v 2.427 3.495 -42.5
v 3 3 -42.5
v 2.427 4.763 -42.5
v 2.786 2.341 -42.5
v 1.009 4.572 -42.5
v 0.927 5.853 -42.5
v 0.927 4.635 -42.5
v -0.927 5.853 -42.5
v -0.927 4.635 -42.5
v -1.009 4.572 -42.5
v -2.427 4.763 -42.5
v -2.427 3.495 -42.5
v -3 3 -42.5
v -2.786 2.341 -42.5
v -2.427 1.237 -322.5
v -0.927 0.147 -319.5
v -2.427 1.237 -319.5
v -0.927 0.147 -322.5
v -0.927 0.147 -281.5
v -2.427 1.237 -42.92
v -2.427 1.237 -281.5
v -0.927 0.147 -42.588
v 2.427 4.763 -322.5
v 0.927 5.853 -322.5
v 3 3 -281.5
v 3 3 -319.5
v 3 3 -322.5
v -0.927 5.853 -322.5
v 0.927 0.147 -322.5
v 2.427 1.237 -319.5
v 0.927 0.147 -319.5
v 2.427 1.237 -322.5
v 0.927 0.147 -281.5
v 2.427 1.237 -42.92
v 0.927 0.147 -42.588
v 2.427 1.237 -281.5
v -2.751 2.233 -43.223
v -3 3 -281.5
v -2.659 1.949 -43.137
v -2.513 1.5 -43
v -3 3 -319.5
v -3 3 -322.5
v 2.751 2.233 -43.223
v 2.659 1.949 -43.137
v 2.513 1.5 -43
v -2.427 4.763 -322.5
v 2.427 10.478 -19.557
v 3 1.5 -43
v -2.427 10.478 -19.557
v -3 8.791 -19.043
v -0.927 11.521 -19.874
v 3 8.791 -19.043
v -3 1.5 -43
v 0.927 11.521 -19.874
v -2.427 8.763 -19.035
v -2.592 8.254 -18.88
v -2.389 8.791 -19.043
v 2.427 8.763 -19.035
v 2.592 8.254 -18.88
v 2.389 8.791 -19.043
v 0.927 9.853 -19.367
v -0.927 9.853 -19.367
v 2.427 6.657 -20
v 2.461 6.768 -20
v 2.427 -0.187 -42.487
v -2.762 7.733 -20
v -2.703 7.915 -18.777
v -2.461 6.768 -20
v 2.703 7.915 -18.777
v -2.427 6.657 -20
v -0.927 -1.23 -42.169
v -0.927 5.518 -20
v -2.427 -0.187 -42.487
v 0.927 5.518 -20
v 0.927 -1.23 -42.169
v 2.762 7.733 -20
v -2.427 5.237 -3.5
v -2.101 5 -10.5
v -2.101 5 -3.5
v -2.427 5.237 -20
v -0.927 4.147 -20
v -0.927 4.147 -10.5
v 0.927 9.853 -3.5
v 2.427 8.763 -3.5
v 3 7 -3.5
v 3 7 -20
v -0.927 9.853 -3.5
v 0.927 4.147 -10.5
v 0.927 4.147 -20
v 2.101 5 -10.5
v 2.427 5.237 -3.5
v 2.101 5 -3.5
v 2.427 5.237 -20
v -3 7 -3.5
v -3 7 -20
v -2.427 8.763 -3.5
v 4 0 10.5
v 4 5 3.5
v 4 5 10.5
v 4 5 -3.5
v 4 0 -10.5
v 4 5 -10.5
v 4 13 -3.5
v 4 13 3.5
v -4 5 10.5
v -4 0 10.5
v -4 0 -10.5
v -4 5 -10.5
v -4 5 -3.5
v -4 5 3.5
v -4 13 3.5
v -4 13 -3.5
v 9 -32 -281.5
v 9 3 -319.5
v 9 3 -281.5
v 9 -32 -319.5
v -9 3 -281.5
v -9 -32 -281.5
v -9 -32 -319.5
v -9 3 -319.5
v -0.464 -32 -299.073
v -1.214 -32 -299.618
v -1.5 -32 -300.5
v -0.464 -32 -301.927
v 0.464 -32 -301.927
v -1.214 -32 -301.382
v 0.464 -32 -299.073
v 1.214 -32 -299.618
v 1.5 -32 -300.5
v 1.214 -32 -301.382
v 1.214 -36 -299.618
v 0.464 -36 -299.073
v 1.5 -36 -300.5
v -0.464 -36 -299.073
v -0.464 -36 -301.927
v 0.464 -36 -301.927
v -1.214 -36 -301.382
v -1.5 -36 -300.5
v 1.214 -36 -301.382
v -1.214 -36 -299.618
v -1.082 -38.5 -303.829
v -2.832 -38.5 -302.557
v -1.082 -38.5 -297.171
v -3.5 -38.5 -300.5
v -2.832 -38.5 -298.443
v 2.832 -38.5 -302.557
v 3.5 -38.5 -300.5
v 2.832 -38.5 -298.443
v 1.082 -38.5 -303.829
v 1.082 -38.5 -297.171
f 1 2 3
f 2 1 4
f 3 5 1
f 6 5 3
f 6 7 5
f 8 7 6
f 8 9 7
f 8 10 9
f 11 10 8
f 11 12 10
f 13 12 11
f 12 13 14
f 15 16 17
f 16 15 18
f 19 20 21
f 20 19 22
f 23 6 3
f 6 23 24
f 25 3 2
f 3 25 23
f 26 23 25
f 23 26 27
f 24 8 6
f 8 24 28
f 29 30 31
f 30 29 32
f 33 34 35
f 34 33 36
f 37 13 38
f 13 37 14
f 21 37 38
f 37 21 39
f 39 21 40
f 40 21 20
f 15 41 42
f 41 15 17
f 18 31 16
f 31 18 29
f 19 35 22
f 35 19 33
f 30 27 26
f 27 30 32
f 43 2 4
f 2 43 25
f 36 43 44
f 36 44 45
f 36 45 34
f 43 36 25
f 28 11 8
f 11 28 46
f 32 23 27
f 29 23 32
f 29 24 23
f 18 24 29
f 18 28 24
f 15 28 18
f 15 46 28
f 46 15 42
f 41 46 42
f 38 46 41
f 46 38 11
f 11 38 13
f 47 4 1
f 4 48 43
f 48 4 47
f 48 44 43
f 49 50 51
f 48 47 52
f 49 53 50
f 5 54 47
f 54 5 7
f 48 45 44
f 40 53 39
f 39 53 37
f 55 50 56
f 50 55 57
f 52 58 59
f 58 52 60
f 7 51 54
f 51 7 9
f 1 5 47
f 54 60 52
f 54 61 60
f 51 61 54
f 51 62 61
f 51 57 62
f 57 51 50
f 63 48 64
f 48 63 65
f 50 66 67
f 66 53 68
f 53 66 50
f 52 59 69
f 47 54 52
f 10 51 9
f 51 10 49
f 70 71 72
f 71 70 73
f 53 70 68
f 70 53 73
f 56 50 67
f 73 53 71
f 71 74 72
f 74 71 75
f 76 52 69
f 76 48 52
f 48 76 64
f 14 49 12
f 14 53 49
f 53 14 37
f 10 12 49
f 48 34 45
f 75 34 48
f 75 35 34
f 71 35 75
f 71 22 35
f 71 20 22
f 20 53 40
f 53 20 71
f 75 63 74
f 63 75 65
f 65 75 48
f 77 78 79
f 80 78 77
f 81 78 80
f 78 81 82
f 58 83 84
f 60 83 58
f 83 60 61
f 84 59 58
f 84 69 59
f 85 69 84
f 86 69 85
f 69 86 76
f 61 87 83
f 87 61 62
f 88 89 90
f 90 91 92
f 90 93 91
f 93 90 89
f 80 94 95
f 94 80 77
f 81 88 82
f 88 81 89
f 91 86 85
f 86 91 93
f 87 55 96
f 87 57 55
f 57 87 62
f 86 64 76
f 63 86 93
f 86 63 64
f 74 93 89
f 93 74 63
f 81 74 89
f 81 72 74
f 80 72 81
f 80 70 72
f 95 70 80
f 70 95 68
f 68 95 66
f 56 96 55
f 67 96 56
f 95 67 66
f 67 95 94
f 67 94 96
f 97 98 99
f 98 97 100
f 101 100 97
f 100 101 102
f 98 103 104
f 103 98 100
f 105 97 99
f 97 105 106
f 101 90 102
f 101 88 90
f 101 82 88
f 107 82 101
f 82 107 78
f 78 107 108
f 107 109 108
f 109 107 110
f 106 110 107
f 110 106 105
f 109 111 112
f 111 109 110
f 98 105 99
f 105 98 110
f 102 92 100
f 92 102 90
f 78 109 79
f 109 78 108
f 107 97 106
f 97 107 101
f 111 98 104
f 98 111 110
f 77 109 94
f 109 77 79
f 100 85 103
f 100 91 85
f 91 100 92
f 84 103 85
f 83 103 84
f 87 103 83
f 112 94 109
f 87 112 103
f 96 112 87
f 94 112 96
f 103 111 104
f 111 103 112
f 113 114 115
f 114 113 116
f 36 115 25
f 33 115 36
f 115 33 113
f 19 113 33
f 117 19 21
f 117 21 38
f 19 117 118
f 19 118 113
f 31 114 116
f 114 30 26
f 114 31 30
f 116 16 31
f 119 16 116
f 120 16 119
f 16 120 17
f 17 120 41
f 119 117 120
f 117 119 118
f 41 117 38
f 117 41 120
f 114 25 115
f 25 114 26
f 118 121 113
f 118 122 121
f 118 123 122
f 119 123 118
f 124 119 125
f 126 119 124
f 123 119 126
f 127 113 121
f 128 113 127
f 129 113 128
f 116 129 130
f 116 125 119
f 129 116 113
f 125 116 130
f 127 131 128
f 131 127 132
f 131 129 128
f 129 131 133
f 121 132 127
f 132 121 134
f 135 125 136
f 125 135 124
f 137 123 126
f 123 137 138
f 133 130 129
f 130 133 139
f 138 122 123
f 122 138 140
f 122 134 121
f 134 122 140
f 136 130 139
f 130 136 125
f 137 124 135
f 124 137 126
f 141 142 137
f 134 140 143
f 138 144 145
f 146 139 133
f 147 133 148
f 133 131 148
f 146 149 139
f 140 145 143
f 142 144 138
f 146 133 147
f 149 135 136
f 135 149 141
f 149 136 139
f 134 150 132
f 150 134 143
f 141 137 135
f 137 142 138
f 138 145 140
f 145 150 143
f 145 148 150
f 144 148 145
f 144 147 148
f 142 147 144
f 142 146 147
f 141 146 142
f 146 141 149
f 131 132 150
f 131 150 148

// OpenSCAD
/*
^  |
l1 |
|  |
v  | < h >
^   \
l2   \
|     \
v      \
^       |
l3      |
|       |
v       |
*/
module bras_seul(l1,l2,l3,h,d) {
    translate([0,d/2,-l1-l2-l3+0.5])
        cylinder(d=d, h=l3);
    translate([0,d/4,-l1-l2])
        rotate([-atan((h-d/2)/l2),0,0])
        cylinder(d=d, h=sqrt(l2^2 + (h-d/2)^2)+1);
    translate([0,h-d/2,-l1])
        cylinder(d=d, h=l1);
}

module fixation(L,l,H,h,e) {
    // Base
    translate([0,h/2,0])
        cube(size=[e, h, L], center=true);
    // Articulation
    translate([0,H/2,0])
        cube(size=[e, H, l], center=true);
}
// fixation(21,7,13,5,8);

module poids(){
    color("orange")
    translate([0, -5, 0])
    cube(size=[18, 35, 38], center=true);
    
    color("grey")
    translate([0, -25/2-10, 0]) 
    rotate([90, 0, 0])
    cylinder(d=3, h=4, $fn=10);

    color("grey")
    translate([0, -25/2-3-11, 0]) 
    rotate([90, 0, 0])
    cylinder(d1=3, d2=7, h=2.5, $fn=10);
}

module bras(l1,l2,l3,h,d) {
    color("grey") bras_seul(l1, l2, l3, h, d);
    color("grey") fixation(21, 7, 13, 5, 8);
    translate([0,-25/2+d/2,-l1-l2-l3+45/2])
        poids();
}

module bras_ogma()
    bras(20, 23, 280, 10, 6);

bras_ogma();
